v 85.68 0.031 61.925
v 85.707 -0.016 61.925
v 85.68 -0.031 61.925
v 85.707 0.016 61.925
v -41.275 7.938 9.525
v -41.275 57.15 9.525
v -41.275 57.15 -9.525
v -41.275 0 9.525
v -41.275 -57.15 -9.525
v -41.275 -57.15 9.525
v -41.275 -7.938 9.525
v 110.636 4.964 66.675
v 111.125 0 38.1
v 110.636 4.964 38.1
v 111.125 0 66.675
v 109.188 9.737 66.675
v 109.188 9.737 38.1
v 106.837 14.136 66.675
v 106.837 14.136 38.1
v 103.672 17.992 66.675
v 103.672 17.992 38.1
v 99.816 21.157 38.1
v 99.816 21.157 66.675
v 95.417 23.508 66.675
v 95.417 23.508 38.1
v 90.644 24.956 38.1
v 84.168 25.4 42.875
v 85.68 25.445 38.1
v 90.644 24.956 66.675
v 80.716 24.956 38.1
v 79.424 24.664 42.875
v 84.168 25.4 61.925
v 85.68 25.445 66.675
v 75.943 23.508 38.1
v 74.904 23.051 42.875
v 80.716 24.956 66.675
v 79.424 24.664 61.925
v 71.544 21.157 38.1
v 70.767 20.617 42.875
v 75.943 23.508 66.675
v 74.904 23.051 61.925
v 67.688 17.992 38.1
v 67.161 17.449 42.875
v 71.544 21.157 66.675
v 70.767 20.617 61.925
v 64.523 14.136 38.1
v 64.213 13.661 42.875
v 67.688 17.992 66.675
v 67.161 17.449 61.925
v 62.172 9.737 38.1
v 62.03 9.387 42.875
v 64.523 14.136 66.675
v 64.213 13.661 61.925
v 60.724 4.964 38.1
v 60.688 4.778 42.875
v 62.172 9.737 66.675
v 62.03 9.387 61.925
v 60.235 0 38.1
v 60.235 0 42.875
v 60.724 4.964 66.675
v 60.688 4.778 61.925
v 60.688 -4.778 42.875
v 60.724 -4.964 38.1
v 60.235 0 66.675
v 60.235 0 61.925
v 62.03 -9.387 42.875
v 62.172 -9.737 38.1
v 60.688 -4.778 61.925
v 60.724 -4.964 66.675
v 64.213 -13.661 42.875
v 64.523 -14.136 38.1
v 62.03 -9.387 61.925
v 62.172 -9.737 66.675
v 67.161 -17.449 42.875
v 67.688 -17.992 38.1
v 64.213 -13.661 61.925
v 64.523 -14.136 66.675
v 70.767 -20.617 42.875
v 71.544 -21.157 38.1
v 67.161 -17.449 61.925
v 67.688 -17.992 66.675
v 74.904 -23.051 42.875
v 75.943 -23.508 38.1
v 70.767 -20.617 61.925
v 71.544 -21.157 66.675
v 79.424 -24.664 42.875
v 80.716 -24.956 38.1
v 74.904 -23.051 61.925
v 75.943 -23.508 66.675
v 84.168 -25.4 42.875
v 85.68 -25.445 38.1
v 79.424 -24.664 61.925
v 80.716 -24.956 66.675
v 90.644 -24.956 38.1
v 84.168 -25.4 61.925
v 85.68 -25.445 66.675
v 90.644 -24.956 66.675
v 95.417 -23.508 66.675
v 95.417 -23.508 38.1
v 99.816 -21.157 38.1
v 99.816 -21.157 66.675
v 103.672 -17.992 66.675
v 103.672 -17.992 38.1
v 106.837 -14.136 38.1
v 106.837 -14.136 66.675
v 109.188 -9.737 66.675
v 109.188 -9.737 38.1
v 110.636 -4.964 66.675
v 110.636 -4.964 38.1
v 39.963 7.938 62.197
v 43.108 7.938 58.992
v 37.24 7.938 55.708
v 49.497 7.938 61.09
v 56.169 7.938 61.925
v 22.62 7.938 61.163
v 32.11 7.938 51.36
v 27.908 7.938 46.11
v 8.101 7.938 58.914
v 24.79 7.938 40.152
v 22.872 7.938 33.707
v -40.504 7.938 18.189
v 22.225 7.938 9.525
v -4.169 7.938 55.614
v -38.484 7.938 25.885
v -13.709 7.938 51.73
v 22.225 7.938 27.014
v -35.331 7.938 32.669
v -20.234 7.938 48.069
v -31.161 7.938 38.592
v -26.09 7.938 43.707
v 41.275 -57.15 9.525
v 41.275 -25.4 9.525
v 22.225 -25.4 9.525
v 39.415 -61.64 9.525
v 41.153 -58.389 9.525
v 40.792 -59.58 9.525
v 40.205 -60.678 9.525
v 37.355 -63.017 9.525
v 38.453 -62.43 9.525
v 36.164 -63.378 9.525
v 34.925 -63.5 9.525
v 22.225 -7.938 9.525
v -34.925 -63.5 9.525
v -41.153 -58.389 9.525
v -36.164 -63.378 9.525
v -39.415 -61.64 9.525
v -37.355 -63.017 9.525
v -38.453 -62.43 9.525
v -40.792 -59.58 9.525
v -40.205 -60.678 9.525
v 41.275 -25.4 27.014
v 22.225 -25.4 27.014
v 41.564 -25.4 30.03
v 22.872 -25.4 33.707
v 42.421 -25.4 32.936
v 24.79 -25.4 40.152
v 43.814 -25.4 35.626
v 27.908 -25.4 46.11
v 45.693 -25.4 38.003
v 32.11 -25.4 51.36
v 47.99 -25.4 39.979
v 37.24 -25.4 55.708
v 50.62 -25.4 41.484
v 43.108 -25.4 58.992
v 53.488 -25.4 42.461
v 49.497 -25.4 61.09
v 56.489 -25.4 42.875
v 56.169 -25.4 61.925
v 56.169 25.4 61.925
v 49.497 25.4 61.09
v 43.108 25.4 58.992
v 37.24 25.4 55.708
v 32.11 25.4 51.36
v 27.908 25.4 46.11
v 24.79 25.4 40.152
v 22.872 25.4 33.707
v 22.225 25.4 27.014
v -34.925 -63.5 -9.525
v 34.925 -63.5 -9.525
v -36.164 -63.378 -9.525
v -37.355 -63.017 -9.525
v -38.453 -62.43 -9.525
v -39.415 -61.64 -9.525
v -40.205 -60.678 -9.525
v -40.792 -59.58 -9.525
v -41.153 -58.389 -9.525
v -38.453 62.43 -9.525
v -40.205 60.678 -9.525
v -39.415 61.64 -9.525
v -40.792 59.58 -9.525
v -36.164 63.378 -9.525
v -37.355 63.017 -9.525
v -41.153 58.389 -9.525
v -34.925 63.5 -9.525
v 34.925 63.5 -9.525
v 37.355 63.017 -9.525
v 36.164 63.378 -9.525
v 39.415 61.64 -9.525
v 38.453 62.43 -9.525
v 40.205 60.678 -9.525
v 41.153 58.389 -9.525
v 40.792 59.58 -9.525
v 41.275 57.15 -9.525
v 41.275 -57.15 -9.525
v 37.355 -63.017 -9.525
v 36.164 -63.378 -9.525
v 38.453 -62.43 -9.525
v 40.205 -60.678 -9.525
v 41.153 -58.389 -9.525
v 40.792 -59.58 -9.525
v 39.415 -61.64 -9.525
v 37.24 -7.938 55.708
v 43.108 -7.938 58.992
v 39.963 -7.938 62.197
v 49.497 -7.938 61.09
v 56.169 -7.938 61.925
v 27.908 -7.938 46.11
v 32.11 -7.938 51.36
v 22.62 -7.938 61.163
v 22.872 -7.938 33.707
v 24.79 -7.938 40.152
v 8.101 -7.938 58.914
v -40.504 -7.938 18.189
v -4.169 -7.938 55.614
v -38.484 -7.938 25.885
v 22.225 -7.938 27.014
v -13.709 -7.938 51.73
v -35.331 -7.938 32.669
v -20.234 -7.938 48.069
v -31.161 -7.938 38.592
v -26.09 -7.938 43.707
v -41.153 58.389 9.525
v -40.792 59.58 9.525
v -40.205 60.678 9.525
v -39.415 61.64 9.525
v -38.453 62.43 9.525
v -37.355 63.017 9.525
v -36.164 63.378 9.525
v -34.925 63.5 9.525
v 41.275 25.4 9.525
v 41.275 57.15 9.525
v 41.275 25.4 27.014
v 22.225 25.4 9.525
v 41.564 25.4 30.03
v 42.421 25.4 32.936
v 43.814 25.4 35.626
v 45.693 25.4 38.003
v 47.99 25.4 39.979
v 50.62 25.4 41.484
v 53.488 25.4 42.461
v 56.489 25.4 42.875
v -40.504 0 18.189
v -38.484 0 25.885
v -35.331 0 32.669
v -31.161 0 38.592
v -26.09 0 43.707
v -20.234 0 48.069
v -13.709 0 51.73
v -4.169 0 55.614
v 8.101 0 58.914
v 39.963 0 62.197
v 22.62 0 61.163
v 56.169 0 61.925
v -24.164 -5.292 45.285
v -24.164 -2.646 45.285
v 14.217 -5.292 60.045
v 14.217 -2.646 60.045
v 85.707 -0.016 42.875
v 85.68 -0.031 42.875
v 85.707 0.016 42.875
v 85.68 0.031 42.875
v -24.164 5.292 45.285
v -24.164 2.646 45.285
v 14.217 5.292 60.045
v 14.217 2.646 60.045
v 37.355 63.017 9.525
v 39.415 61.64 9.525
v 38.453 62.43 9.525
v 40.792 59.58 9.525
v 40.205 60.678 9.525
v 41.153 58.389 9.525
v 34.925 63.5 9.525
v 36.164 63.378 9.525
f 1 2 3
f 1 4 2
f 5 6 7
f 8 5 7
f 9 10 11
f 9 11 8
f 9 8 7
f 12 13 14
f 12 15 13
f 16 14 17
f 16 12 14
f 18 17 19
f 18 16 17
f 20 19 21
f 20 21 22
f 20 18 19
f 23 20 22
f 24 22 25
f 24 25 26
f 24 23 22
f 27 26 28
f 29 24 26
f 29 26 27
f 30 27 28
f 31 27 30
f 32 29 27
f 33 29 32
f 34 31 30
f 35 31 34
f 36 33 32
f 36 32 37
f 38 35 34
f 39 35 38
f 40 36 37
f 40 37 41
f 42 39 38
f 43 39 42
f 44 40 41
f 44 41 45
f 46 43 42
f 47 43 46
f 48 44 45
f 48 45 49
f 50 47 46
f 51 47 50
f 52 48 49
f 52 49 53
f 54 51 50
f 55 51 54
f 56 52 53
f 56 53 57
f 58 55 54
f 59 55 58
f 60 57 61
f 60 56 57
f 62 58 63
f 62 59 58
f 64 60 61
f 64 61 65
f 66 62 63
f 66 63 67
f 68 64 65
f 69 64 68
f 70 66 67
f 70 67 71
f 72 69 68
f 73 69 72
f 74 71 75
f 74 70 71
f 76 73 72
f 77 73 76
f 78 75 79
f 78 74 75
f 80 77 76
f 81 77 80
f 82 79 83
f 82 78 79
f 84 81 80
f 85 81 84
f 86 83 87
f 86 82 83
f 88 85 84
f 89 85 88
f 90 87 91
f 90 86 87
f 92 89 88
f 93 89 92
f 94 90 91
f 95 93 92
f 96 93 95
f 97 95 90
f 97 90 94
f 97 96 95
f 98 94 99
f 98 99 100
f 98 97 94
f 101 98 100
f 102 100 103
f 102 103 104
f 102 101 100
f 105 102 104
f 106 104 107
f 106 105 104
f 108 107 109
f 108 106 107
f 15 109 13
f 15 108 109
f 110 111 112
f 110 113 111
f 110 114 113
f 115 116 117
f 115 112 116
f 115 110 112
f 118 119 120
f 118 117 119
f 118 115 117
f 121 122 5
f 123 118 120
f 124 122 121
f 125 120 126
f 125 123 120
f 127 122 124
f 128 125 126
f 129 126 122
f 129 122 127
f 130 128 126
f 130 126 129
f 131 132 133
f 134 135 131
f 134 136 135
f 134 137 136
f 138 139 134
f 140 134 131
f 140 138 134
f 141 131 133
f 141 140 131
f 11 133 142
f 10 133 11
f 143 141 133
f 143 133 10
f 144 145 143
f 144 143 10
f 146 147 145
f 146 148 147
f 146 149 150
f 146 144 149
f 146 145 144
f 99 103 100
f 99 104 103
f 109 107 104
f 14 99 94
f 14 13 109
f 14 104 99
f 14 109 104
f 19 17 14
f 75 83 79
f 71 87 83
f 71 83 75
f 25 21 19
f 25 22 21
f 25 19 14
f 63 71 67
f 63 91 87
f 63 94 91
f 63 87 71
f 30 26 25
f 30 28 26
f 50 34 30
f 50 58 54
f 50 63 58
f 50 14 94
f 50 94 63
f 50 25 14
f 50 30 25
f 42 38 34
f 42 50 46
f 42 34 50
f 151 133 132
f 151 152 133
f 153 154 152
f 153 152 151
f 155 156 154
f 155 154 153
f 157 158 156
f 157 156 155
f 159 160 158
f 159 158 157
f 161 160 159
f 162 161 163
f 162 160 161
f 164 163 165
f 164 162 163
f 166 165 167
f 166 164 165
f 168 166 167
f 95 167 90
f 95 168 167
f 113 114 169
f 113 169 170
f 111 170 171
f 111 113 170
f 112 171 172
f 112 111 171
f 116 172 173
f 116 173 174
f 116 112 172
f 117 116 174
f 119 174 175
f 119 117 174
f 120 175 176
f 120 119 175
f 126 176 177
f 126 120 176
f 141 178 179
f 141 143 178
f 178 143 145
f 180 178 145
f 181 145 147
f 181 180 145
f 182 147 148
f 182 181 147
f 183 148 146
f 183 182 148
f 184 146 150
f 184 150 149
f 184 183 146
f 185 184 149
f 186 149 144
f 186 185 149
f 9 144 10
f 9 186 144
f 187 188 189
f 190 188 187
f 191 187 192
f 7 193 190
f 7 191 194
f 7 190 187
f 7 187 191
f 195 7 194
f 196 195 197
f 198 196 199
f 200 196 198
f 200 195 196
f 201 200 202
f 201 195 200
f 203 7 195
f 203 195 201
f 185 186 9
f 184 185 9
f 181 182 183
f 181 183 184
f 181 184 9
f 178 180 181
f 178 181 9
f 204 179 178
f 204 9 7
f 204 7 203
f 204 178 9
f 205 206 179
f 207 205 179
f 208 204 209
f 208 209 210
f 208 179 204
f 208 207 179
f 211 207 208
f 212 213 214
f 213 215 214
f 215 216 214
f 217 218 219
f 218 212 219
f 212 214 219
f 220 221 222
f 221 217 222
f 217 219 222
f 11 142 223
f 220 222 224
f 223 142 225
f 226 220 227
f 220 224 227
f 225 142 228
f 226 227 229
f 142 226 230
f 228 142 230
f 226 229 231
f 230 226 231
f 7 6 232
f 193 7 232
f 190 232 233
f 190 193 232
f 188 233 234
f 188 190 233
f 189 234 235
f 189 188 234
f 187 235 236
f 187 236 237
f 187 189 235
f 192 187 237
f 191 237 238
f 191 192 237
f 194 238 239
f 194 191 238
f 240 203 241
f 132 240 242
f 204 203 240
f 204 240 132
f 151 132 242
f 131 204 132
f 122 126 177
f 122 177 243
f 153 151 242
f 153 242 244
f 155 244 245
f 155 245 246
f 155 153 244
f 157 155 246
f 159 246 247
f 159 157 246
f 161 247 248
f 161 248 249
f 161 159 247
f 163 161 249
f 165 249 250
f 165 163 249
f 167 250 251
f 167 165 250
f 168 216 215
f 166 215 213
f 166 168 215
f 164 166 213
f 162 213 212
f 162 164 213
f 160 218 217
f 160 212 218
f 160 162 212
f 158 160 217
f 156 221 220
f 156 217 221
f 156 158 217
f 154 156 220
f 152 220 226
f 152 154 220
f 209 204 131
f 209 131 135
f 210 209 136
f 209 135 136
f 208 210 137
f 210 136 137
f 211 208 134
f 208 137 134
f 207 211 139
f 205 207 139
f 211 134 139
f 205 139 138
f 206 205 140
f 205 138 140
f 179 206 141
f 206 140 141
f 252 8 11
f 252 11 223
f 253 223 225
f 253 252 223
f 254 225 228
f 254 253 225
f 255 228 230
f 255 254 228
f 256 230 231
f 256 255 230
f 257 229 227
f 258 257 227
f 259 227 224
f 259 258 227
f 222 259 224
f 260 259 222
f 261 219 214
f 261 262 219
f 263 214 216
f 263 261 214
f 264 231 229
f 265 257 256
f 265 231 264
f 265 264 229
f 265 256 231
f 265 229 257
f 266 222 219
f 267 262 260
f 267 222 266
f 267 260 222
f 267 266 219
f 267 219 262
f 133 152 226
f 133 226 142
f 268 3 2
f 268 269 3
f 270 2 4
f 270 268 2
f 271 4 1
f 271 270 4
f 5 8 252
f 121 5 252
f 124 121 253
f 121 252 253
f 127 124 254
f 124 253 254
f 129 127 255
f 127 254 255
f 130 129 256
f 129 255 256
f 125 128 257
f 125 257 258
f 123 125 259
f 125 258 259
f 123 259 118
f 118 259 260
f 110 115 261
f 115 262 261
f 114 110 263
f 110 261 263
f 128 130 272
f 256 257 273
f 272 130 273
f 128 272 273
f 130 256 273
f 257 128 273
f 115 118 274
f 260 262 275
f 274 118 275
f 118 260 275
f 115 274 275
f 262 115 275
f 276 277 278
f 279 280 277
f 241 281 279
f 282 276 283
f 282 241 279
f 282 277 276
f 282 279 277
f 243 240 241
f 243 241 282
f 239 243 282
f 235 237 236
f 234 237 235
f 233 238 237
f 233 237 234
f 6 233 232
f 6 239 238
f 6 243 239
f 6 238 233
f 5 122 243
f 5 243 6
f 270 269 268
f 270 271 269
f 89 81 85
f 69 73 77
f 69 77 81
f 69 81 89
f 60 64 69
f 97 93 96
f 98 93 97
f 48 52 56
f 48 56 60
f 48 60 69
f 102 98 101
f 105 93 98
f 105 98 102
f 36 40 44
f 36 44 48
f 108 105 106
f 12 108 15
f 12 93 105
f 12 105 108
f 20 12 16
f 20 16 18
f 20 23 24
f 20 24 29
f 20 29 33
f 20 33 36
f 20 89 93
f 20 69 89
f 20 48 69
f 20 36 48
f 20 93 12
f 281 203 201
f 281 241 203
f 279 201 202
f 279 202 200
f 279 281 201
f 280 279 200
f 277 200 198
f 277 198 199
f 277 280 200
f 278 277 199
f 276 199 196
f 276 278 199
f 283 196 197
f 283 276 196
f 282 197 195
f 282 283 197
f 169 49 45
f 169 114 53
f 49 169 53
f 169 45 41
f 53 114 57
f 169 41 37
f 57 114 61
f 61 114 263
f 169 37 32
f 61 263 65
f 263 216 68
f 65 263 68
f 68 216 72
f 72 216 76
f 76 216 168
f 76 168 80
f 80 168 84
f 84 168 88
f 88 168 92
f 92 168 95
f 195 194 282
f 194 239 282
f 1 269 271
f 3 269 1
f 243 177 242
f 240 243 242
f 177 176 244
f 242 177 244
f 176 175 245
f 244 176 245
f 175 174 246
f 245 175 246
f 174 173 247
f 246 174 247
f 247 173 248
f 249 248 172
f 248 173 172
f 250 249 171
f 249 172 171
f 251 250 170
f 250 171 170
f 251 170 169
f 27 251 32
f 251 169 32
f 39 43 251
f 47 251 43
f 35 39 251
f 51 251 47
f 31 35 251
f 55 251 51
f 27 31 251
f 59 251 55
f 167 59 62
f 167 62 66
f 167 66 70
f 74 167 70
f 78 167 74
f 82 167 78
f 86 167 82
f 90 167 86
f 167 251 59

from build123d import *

# Parameters (mm, degrees)
F1_DEPTH = 63.5
F2_DEPTH = 25.4
F3_DEPTH = 7.9375
F0_W     = 25.3550079346
F0_H     = 19.05
F5_DEPTH = 25.4
F6_R     = 6.35


with BuildPart() as f1:
    # F0 (on Front) → F1 (new body, symmetric)
    with BuildSketch(Plane.XZ):
        Polygon((-41.275, -9.525), (41.275, -9.525), (41.275, 9.525), (22.225, 9.525), (-41.275, 9.525), align=None)
    extrude(amount=F1_DEPTH, both=True)

    # F0 (on Front) → F2 (join, symmetric)
    with BuildSketch(Plane.XZ):
        with BuildLine():
            Line((22.225, 9.525), (41.275, 9.525))
            Line((41.275, 9.525), (41.275, 27.0139750475))
            ThreePointArc((41.275, 27.0139750475), (45.6932996526, 38.0030442596), (56.4888131842, 42.8752))
            Line((56.4888131842, 42.8752), (60.325, 42.8752))
            Line((60.325, 42.8752), (60.325, 61.9252))
            Line((60.325, 61.9252), (56.1691853824, 61.9252))
            ThreePointArc((56.1691853824, 61.9252), (32.1099263627, 51.3604396212), (22.225, 27.0139750475))
            Line((22.225, 27.0139750475), (22.225, 9.525))
        make_face()
    extrude(amount=F2_DEPTH, both=True)

    # F0 (on Front) → F3 (join, symmetric)
    with BuildSketch(Plane.XZ):
        with BuildLine():
            add(Edge.make_bspline(
                [(-41.275, 9.525), (-40.7000668347, 58.4918707609), (18.3322690427, 63.7783482671), (56.1691853824, 61.9252)],
                knots=[0, 0, 0, 0, 110.6397316739, 110.6397316739, 110.6397316739, 110.6397316739], degree=3))
            Line((-41.275, 9.525), (22.225, 9.525))
            Line((22.225, 9.525), (22.225, 27.0139750475))
            ThreePointArc((22.225, 27.0139750475), (32.1099263627, 51.3604396212), (56.1691853824, 61.9252))
        make_face()
    extrude(amount=F3_DEPTH, both=True)

    # F0 (on Front) → F4 (revolve)
    with BuildSketch(Plane.XZ):
        Polygon((85.6800079346, 66.675), (85.6800079346, 61.9252), (85.7112655525, 61.9252), (85.7112655525, 42.8752), (85.6800079346, 42.8752), (85.6800079346, 38.1), (111.125, 38.1), (111.125, 66.675), align=None)
    revolve(axis=Axis((85.6800079346, 0, 52.3875), (0, 0, 1)))

    # F0 (on Front) → F5 (join, symmetric)
    with BuildSketch(Plane.XZ):
        with Locations((73.0025039673, 52.4002)):
            Rectangle(F0_W, F0_H)
    extrude(amount=F5_DEPTH, both=True)

    # F6
    f6_edges = [f1.edges().sort_by_distance(p)[0] for p in [
        (41.275, -63.5, 0),
        (-41.275, -63.5, 0),
        (41.275, 63.5, 0),
        (-41.275, 63.5, 0),
    ]]
    fillet(f6_edges, radius=F6_R)


solid = f1.part
